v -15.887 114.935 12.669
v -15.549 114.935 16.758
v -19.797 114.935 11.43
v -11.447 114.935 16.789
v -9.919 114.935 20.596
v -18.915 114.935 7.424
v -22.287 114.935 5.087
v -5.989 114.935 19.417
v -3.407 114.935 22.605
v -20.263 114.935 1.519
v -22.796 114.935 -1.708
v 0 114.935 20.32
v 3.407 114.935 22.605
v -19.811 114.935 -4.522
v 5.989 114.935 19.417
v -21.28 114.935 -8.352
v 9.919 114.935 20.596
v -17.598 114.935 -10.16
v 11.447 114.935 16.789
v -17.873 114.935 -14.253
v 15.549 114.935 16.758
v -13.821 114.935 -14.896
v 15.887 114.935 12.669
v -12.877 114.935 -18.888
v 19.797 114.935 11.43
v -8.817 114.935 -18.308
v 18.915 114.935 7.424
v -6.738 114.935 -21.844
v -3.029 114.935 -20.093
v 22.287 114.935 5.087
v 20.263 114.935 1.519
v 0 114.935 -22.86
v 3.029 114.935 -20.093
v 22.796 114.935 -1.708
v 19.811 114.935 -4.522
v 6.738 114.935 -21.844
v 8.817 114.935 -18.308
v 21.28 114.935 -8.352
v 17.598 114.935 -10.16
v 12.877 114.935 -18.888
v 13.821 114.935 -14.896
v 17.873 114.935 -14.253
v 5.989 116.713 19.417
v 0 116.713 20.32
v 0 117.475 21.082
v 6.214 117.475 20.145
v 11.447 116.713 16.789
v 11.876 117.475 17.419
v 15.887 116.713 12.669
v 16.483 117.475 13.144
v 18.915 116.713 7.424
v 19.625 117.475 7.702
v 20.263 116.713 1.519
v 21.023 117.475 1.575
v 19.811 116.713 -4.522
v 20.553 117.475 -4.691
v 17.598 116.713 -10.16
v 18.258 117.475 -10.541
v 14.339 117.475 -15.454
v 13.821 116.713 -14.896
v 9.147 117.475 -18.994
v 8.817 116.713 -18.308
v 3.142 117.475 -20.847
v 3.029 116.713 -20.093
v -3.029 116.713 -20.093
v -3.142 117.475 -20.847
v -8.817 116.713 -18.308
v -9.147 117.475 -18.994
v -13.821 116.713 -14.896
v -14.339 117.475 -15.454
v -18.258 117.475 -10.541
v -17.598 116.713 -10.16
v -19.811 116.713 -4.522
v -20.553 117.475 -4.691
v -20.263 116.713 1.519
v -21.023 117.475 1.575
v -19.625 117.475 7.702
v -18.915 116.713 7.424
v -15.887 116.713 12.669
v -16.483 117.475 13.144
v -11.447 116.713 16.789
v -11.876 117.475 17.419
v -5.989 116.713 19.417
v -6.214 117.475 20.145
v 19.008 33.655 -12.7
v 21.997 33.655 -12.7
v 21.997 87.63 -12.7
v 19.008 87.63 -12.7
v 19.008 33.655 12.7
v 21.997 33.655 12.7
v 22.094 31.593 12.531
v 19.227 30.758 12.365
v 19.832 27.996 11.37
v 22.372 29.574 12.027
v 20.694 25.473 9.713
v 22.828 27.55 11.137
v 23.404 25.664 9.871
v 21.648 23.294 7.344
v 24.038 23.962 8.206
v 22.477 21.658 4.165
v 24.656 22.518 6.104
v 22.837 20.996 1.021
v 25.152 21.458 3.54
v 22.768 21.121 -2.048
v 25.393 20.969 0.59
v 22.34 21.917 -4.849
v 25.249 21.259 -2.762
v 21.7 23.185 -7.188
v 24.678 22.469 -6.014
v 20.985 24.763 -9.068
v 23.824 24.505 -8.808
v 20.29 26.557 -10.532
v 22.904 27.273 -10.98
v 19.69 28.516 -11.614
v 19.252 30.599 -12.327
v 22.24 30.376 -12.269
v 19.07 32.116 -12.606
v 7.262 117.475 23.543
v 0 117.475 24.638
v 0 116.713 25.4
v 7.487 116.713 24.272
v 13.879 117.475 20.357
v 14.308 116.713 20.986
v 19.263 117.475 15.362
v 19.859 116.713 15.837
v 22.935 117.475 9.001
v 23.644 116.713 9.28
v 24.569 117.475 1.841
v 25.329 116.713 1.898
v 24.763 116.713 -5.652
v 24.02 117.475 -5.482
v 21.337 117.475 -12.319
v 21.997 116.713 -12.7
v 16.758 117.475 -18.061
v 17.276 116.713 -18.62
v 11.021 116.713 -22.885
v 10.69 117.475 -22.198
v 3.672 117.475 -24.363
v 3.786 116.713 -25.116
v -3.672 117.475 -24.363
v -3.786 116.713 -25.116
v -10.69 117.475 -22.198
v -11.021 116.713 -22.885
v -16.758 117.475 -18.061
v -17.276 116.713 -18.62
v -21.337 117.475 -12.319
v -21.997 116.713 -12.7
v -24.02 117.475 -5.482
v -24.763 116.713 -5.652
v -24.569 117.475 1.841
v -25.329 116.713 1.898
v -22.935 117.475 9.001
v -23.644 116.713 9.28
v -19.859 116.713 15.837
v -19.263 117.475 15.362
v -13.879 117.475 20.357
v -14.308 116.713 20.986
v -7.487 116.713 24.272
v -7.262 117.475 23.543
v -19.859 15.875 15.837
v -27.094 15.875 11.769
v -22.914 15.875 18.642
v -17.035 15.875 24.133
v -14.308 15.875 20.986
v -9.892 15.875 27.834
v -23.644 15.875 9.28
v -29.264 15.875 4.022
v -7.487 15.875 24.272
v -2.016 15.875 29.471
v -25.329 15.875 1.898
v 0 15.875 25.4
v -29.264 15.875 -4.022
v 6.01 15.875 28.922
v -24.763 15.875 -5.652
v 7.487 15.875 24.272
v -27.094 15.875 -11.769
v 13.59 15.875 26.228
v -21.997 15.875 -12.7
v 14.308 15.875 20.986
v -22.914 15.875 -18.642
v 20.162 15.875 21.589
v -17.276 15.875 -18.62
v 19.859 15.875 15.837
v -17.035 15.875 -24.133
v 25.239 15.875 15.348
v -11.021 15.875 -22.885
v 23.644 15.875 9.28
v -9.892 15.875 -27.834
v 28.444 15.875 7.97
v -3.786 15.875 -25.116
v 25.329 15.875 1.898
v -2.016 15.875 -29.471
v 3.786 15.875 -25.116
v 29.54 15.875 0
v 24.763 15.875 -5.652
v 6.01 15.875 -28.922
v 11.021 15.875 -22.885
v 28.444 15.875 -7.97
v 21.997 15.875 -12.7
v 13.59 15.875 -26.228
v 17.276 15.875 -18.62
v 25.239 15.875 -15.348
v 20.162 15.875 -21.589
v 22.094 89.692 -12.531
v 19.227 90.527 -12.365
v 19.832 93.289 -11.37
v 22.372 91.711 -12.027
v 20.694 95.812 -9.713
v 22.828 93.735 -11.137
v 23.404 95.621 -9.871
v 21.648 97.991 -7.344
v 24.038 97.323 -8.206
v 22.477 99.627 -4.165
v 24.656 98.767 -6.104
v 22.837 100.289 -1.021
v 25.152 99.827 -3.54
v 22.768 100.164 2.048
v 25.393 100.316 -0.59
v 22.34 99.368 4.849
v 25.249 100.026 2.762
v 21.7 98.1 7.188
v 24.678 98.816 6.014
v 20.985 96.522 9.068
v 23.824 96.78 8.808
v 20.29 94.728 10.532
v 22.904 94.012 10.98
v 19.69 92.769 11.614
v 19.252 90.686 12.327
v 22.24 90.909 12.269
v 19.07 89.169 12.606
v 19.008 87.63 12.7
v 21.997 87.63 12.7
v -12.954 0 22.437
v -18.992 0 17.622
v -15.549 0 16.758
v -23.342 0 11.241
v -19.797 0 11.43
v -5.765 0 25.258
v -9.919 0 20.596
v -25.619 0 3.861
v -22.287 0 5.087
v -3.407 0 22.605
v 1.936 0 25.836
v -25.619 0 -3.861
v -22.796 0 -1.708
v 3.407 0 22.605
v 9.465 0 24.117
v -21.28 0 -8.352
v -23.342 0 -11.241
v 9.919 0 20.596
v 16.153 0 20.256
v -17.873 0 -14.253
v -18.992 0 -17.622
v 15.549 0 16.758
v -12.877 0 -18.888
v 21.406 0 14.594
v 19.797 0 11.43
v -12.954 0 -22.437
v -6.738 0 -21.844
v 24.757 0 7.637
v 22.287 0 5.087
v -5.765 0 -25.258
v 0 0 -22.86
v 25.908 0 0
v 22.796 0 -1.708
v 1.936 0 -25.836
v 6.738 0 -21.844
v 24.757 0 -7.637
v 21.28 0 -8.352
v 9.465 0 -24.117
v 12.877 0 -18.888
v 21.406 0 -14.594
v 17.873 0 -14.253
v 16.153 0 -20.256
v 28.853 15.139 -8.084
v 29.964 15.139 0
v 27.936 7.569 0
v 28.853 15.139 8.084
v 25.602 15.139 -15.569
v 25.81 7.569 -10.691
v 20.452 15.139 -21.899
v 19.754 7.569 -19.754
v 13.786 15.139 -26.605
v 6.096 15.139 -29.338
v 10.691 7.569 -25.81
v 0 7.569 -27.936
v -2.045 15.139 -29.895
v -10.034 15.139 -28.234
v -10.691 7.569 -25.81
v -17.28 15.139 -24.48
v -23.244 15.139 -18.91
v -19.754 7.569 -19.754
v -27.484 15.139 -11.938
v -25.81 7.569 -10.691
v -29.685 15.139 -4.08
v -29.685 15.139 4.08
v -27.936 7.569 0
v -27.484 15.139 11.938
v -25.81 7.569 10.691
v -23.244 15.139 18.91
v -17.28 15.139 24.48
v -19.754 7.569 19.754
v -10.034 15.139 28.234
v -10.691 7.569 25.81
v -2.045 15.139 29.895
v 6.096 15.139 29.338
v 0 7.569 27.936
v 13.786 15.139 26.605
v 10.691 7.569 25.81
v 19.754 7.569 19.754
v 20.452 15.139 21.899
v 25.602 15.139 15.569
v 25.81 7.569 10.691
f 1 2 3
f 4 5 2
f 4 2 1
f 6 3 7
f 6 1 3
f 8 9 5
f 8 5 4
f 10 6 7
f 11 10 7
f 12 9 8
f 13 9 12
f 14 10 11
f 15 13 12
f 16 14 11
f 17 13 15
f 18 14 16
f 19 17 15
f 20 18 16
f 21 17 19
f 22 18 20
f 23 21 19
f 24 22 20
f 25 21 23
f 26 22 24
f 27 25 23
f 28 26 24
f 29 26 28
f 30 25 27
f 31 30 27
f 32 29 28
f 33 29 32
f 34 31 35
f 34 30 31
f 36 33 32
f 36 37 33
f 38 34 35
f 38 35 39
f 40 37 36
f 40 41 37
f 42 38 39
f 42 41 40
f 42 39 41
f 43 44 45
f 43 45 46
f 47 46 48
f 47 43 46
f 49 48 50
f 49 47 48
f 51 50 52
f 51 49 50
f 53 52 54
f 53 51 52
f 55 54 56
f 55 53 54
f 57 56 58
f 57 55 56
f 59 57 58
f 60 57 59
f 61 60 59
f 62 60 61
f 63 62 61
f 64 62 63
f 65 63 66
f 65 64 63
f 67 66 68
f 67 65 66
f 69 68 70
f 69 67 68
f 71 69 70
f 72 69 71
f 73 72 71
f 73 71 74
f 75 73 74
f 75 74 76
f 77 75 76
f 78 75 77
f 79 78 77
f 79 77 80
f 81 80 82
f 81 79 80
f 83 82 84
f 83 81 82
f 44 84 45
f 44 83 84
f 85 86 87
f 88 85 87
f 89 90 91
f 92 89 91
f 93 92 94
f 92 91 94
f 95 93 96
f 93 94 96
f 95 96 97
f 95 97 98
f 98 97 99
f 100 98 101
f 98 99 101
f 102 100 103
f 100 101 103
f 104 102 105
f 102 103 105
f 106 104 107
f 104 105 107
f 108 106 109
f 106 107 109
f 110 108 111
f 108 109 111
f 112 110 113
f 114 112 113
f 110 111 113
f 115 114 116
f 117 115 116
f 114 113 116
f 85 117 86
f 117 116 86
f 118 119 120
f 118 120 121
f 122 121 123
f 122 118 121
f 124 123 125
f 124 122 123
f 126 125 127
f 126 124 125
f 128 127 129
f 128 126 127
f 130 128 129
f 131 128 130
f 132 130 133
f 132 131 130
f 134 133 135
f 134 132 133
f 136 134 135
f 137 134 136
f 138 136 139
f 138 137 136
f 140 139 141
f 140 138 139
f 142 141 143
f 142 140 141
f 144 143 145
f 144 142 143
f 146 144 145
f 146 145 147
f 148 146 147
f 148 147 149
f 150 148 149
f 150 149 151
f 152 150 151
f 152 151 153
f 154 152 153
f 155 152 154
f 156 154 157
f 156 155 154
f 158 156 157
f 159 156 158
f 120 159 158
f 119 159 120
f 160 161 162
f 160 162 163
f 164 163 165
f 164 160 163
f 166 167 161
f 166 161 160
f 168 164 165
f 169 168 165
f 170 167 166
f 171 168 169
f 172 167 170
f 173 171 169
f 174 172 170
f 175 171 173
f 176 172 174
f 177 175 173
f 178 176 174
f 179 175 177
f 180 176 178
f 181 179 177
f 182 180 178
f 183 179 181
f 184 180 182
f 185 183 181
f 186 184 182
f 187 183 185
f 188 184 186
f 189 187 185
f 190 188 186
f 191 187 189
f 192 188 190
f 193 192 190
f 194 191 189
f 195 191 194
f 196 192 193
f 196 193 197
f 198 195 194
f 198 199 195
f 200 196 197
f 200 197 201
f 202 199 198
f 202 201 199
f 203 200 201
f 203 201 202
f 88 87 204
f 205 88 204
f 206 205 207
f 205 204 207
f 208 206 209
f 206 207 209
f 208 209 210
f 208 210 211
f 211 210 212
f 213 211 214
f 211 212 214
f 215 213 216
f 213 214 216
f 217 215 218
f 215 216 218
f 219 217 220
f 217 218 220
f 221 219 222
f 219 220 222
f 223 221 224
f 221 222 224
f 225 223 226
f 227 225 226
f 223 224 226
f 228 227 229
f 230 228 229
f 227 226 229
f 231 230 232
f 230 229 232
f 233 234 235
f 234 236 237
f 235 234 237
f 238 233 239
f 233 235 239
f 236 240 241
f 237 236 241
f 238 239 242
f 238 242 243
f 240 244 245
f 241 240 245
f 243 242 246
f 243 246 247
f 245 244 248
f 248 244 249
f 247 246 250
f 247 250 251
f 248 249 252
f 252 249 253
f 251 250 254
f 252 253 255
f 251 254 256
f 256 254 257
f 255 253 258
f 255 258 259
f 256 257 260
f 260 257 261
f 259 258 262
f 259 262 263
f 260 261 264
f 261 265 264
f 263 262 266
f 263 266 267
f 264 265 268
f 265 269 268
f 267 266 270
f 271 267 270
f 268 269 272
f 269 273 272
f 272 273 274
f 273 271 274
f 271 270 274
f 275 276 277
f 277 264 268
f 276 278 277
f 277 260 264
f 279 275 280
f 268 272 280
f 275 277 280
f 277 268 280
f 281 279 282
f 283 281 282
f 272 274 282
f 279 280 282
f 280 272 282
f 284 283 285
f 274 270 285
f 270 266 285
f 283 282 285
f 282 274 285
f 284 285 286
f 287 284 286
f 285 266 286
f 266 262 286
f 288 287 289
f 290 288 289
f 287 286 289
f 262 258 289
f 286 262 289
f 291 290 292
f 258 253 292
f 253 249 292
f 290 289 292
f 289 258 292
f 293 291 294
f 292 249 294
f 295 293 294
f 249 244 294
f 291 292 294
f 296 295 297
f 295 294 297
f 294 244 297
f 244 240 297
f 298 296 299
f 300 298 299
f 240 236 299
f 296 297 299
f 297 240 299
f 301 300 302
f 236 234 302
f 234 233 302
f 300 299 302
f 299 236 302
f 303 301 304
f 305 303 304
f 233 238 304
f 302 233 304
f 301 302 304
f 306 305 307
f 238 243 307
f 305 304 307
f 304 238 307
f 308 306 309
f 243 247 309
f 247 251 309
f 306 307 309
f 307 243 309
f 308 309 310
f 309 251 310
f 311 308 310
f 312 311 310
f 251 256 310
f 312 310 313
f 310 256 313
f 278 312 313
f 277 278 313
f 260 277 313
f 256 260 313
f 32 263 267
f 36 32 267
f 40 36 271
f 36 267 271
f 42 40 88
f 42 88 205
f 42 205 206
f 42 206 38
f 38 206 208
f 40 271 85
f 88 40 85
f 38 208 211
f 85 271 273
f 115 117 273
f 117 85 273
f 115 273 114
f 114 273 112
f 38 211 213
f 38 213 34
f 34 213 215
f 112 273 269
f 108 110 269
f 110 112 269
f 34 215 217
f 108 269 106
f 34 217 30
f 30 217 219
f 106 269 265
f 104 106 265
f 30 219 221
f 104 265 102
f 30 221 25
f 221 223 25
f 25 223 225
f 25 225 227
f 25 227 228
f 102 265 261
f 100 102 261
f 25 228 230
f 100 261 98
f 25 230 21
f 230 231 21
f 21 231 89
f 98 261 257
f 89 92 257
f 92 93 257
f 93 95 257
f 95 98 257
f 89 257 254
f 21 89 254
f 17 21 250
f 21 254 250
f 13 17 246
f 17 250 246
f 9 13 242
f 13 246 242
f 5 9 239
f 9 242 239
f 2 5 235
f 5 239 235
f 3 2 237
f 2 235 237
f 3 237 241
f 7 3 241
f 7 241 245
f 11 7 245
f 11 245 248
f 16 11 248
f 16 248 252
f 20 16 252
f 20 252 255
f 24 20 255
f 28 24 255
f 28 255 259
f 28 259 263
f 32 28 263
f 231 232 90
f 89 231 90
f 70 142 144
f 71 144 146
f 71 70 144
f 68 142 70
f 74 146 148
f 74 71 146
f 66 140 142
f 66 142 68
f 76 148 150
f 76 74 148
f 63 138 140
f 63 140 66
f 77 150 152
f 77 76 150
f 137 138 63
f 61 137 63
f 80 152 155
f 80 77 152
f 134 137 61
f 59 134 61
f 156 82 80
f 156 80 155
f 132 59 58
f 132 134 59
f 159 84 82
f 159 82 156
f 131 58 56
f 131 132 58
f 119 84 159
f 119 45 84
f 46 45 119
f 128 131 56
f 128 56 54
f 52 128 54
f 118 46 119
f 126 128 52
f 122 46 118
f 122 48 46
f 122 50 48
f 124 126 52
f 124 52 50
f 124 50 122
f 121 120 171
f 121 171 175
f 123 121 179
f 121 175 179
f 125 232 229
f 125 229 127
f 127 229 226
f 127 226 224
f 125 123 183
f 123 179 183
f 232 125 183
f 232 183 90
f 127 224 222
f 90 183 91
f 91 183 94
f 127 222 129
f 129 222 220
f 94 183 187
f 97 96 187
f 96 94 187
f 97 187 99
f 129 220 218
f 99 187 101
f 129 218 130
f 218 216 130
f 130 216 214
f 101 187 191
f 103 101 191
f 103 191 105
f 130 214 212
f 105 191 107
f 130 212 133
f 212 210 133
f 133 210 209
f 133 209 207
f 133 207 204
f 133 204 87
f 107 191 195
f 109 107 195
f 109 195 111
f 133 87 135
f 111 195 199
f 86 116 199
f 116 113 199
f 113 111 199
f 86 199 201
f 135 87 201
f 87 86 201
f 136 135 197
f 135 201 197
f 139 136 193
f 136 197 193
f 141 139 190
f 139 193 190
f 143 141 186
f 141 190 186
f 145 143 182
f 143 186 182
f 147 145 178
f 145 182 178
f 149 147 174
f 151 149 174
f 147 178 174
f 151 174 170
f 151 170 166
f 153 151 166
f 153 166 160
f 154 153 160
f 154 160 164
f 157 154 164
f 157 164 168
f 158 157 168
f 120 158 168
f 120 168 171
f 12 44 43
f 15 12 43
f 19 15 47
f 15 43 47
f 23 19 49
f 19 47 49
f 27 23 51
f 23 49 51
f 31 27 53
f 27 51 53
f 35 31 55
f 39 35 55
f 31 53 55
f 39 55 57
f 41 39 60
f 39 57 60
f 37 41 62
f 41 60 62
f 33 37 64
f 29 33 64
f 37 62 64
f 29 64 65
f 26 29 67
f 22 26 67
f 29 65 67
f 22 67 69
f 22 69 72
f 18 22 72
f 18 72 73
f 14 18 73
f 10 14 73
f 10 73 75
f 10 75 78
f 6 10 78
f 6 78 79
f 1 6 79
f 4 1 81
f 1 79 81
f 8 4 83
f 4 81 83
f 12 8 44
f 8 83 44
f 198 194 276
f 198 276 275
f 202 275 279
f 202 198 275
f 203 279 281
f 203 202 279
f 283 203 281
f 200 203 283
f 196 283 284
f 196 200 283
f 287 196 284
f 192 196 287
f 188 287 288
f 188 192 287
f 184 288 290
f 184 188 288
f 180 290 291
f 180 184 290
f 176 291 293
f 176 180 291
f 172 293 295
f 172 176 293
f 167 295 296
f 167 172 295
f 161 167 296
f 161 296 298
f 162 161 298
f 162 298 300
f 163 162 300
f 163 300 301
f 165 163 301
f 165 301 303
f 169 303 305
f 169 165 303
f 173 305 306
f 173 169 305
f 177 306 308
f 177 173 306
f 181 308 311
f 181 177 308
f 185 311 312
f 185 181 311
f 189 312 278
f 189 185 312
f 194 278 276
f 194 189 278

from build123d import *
from OCP.BRepFilletAPI import BRepFilletAPI_MakeChamfer

# Parameters (mm, degrees)
SKETCH1_R           = 25.908
BOSS_EXTRUDE1_DEPTH = 15.875
BOSS_EXTRUDE1_DRAFT = -15
SKETCH2_R           = 25.4
BOSS_EXTRUDE2_DEPTH = 101.6
SKETCH5_R           = 22.86
CUT_EXTRUDE2_DEPTH  = 114.935
SKETCH6_R           = 20.32
CUT_EXTRUDE3_DEPTH  = 2.54
CHAMFER1_SIZE       = 0.762
CHAMFER1_SIZE2      = 0.622170395
CUT_EXTRUDE6_DEPTH  = 7.62


with BuildPart() as part:
    # Sketch1 → Boss-Extrude1 (with draft: the straight prism first)
    with BuildSketch(Plane(origin=(0, 0, 0), x_dir=(1, 0, 0), z_dir=(0, 1, 0))):
        Circle(SKETCH1_R)
    extrude(amount=BOSS_EXTRUDE1_DEPTH)
    # Boss-Extrude1: the draft: its side faces are tilted about the plane it starts from
    boss_extrude1_sides = [part.faces().sort_by_distance(p)[0] for p in [
        (-25.908, 7.9375, 0),
    ]]
    draft(boss_extrude1_sides, Plane(origin=(0, 0, 0), x_dir=(1, 0, 0), z_dir=(0, 1, 0)), BOSS_EXTRUDE1_DRAFT)

    # Sketch2 → Boss-Extrude2 (add)
    with BuildSketch(Plane(origin=(0, 15.875, 0), x_dir=(1, 0, 0), z_dir=(0, 1, 0))):
        with Locations(Location((0, 0, 0), (0, 0, 270))):
            Circle(SKETCH2_R)
    extrude(amount=BOSS_EXTRUDE2_DEPTH)

    # Sketch5 → Cut-Extrude2 (cut)
    with BuildSketch(Plane.XZ):
        with Locations(Location((0, 0, 0), (0, 0, 270))):
            Circle(SKETCH5_R)
    extrude(amount=-CUT_EXTRUDE2_DEPTH, mode=Mode.SUBTRACT)

    # Sketch6 → Cut-Extrude3 (cut)
    with BuildSketch(Plane(origin=(0, 117.475, 0), x_dir=(1, 0, 0), z_dir=(0, 1, 0))):
        with Locations(Location((0, 0, 0), (0, 0, 270))):
            Circle(SKETCH6_R)
    extrude(amount=-CUT_EXTRUDE3_DEPTH, mode=Mode.SUBTRACT)

    # Chamfer1: one chamfer whose edges measure the first distance from different faces: ONE call of the kernel's chamfer builder (chamfer() names one face for all edges)
    chamfer1_edges_1 = [part.edges().sort_by_distance(p)[0] for p in [
        (0, 117.475, -20.32),
        (0, 117.475, -25.4),
    ]]
    chamfer1_edges_2 = [part.edges().sort_by_distance(p)[0] for p in [
        (-30.16169343, 15.875, 0),
    ]]
    chamfer1_side_2 = [part.faces().sort_by_distance(p)[0] for p in [
        (-28.034846715, 7.9375, 0),
    ]]
    chamfer1 = BRepFilletAPI_MakeChamfer(part.part.solid().wrapped)
    for e in chamfer1_edges_1:
        chamfer1.Add(CHAMFER1_SIZE, e.wrapped)
    for e in chamfer1_edges_2:
        chamfer1.Add(CHAMFER1_SIZE, CHAMFER1_SIZE2, e.wrapped, chamfer1_side_2[0].wrapped)  # the first distance lies on this face
    add(Compound.cast(chamfer1.Shape()), mode=Mode.REPLACE)

    # Sketch7 → Cut-Extrude6 (cut)
    with BuildSketch(Plane(origin=(25.4, 0, 0), x_dir=(0, 0, -1), z_dir=(1, 0, 0))):
        with BuildLine():
            Line((-12.7, 87.63), (-12.7, 33.655))
            ThreePointArc((-12.7, 33.655), (0, 20.955), (12.7, 33.655))
            Line((12.7, 33.655), (12.7, 87.63))
            ThreePointArc((12.7, 87.63), (0, 100.33), (-12.7, 87.63))
        make_face()
    extrude(amount=-CUT_EXTRUDE6_DEPTH, mode=Mode.SUBTRACT)


solid = part.part
